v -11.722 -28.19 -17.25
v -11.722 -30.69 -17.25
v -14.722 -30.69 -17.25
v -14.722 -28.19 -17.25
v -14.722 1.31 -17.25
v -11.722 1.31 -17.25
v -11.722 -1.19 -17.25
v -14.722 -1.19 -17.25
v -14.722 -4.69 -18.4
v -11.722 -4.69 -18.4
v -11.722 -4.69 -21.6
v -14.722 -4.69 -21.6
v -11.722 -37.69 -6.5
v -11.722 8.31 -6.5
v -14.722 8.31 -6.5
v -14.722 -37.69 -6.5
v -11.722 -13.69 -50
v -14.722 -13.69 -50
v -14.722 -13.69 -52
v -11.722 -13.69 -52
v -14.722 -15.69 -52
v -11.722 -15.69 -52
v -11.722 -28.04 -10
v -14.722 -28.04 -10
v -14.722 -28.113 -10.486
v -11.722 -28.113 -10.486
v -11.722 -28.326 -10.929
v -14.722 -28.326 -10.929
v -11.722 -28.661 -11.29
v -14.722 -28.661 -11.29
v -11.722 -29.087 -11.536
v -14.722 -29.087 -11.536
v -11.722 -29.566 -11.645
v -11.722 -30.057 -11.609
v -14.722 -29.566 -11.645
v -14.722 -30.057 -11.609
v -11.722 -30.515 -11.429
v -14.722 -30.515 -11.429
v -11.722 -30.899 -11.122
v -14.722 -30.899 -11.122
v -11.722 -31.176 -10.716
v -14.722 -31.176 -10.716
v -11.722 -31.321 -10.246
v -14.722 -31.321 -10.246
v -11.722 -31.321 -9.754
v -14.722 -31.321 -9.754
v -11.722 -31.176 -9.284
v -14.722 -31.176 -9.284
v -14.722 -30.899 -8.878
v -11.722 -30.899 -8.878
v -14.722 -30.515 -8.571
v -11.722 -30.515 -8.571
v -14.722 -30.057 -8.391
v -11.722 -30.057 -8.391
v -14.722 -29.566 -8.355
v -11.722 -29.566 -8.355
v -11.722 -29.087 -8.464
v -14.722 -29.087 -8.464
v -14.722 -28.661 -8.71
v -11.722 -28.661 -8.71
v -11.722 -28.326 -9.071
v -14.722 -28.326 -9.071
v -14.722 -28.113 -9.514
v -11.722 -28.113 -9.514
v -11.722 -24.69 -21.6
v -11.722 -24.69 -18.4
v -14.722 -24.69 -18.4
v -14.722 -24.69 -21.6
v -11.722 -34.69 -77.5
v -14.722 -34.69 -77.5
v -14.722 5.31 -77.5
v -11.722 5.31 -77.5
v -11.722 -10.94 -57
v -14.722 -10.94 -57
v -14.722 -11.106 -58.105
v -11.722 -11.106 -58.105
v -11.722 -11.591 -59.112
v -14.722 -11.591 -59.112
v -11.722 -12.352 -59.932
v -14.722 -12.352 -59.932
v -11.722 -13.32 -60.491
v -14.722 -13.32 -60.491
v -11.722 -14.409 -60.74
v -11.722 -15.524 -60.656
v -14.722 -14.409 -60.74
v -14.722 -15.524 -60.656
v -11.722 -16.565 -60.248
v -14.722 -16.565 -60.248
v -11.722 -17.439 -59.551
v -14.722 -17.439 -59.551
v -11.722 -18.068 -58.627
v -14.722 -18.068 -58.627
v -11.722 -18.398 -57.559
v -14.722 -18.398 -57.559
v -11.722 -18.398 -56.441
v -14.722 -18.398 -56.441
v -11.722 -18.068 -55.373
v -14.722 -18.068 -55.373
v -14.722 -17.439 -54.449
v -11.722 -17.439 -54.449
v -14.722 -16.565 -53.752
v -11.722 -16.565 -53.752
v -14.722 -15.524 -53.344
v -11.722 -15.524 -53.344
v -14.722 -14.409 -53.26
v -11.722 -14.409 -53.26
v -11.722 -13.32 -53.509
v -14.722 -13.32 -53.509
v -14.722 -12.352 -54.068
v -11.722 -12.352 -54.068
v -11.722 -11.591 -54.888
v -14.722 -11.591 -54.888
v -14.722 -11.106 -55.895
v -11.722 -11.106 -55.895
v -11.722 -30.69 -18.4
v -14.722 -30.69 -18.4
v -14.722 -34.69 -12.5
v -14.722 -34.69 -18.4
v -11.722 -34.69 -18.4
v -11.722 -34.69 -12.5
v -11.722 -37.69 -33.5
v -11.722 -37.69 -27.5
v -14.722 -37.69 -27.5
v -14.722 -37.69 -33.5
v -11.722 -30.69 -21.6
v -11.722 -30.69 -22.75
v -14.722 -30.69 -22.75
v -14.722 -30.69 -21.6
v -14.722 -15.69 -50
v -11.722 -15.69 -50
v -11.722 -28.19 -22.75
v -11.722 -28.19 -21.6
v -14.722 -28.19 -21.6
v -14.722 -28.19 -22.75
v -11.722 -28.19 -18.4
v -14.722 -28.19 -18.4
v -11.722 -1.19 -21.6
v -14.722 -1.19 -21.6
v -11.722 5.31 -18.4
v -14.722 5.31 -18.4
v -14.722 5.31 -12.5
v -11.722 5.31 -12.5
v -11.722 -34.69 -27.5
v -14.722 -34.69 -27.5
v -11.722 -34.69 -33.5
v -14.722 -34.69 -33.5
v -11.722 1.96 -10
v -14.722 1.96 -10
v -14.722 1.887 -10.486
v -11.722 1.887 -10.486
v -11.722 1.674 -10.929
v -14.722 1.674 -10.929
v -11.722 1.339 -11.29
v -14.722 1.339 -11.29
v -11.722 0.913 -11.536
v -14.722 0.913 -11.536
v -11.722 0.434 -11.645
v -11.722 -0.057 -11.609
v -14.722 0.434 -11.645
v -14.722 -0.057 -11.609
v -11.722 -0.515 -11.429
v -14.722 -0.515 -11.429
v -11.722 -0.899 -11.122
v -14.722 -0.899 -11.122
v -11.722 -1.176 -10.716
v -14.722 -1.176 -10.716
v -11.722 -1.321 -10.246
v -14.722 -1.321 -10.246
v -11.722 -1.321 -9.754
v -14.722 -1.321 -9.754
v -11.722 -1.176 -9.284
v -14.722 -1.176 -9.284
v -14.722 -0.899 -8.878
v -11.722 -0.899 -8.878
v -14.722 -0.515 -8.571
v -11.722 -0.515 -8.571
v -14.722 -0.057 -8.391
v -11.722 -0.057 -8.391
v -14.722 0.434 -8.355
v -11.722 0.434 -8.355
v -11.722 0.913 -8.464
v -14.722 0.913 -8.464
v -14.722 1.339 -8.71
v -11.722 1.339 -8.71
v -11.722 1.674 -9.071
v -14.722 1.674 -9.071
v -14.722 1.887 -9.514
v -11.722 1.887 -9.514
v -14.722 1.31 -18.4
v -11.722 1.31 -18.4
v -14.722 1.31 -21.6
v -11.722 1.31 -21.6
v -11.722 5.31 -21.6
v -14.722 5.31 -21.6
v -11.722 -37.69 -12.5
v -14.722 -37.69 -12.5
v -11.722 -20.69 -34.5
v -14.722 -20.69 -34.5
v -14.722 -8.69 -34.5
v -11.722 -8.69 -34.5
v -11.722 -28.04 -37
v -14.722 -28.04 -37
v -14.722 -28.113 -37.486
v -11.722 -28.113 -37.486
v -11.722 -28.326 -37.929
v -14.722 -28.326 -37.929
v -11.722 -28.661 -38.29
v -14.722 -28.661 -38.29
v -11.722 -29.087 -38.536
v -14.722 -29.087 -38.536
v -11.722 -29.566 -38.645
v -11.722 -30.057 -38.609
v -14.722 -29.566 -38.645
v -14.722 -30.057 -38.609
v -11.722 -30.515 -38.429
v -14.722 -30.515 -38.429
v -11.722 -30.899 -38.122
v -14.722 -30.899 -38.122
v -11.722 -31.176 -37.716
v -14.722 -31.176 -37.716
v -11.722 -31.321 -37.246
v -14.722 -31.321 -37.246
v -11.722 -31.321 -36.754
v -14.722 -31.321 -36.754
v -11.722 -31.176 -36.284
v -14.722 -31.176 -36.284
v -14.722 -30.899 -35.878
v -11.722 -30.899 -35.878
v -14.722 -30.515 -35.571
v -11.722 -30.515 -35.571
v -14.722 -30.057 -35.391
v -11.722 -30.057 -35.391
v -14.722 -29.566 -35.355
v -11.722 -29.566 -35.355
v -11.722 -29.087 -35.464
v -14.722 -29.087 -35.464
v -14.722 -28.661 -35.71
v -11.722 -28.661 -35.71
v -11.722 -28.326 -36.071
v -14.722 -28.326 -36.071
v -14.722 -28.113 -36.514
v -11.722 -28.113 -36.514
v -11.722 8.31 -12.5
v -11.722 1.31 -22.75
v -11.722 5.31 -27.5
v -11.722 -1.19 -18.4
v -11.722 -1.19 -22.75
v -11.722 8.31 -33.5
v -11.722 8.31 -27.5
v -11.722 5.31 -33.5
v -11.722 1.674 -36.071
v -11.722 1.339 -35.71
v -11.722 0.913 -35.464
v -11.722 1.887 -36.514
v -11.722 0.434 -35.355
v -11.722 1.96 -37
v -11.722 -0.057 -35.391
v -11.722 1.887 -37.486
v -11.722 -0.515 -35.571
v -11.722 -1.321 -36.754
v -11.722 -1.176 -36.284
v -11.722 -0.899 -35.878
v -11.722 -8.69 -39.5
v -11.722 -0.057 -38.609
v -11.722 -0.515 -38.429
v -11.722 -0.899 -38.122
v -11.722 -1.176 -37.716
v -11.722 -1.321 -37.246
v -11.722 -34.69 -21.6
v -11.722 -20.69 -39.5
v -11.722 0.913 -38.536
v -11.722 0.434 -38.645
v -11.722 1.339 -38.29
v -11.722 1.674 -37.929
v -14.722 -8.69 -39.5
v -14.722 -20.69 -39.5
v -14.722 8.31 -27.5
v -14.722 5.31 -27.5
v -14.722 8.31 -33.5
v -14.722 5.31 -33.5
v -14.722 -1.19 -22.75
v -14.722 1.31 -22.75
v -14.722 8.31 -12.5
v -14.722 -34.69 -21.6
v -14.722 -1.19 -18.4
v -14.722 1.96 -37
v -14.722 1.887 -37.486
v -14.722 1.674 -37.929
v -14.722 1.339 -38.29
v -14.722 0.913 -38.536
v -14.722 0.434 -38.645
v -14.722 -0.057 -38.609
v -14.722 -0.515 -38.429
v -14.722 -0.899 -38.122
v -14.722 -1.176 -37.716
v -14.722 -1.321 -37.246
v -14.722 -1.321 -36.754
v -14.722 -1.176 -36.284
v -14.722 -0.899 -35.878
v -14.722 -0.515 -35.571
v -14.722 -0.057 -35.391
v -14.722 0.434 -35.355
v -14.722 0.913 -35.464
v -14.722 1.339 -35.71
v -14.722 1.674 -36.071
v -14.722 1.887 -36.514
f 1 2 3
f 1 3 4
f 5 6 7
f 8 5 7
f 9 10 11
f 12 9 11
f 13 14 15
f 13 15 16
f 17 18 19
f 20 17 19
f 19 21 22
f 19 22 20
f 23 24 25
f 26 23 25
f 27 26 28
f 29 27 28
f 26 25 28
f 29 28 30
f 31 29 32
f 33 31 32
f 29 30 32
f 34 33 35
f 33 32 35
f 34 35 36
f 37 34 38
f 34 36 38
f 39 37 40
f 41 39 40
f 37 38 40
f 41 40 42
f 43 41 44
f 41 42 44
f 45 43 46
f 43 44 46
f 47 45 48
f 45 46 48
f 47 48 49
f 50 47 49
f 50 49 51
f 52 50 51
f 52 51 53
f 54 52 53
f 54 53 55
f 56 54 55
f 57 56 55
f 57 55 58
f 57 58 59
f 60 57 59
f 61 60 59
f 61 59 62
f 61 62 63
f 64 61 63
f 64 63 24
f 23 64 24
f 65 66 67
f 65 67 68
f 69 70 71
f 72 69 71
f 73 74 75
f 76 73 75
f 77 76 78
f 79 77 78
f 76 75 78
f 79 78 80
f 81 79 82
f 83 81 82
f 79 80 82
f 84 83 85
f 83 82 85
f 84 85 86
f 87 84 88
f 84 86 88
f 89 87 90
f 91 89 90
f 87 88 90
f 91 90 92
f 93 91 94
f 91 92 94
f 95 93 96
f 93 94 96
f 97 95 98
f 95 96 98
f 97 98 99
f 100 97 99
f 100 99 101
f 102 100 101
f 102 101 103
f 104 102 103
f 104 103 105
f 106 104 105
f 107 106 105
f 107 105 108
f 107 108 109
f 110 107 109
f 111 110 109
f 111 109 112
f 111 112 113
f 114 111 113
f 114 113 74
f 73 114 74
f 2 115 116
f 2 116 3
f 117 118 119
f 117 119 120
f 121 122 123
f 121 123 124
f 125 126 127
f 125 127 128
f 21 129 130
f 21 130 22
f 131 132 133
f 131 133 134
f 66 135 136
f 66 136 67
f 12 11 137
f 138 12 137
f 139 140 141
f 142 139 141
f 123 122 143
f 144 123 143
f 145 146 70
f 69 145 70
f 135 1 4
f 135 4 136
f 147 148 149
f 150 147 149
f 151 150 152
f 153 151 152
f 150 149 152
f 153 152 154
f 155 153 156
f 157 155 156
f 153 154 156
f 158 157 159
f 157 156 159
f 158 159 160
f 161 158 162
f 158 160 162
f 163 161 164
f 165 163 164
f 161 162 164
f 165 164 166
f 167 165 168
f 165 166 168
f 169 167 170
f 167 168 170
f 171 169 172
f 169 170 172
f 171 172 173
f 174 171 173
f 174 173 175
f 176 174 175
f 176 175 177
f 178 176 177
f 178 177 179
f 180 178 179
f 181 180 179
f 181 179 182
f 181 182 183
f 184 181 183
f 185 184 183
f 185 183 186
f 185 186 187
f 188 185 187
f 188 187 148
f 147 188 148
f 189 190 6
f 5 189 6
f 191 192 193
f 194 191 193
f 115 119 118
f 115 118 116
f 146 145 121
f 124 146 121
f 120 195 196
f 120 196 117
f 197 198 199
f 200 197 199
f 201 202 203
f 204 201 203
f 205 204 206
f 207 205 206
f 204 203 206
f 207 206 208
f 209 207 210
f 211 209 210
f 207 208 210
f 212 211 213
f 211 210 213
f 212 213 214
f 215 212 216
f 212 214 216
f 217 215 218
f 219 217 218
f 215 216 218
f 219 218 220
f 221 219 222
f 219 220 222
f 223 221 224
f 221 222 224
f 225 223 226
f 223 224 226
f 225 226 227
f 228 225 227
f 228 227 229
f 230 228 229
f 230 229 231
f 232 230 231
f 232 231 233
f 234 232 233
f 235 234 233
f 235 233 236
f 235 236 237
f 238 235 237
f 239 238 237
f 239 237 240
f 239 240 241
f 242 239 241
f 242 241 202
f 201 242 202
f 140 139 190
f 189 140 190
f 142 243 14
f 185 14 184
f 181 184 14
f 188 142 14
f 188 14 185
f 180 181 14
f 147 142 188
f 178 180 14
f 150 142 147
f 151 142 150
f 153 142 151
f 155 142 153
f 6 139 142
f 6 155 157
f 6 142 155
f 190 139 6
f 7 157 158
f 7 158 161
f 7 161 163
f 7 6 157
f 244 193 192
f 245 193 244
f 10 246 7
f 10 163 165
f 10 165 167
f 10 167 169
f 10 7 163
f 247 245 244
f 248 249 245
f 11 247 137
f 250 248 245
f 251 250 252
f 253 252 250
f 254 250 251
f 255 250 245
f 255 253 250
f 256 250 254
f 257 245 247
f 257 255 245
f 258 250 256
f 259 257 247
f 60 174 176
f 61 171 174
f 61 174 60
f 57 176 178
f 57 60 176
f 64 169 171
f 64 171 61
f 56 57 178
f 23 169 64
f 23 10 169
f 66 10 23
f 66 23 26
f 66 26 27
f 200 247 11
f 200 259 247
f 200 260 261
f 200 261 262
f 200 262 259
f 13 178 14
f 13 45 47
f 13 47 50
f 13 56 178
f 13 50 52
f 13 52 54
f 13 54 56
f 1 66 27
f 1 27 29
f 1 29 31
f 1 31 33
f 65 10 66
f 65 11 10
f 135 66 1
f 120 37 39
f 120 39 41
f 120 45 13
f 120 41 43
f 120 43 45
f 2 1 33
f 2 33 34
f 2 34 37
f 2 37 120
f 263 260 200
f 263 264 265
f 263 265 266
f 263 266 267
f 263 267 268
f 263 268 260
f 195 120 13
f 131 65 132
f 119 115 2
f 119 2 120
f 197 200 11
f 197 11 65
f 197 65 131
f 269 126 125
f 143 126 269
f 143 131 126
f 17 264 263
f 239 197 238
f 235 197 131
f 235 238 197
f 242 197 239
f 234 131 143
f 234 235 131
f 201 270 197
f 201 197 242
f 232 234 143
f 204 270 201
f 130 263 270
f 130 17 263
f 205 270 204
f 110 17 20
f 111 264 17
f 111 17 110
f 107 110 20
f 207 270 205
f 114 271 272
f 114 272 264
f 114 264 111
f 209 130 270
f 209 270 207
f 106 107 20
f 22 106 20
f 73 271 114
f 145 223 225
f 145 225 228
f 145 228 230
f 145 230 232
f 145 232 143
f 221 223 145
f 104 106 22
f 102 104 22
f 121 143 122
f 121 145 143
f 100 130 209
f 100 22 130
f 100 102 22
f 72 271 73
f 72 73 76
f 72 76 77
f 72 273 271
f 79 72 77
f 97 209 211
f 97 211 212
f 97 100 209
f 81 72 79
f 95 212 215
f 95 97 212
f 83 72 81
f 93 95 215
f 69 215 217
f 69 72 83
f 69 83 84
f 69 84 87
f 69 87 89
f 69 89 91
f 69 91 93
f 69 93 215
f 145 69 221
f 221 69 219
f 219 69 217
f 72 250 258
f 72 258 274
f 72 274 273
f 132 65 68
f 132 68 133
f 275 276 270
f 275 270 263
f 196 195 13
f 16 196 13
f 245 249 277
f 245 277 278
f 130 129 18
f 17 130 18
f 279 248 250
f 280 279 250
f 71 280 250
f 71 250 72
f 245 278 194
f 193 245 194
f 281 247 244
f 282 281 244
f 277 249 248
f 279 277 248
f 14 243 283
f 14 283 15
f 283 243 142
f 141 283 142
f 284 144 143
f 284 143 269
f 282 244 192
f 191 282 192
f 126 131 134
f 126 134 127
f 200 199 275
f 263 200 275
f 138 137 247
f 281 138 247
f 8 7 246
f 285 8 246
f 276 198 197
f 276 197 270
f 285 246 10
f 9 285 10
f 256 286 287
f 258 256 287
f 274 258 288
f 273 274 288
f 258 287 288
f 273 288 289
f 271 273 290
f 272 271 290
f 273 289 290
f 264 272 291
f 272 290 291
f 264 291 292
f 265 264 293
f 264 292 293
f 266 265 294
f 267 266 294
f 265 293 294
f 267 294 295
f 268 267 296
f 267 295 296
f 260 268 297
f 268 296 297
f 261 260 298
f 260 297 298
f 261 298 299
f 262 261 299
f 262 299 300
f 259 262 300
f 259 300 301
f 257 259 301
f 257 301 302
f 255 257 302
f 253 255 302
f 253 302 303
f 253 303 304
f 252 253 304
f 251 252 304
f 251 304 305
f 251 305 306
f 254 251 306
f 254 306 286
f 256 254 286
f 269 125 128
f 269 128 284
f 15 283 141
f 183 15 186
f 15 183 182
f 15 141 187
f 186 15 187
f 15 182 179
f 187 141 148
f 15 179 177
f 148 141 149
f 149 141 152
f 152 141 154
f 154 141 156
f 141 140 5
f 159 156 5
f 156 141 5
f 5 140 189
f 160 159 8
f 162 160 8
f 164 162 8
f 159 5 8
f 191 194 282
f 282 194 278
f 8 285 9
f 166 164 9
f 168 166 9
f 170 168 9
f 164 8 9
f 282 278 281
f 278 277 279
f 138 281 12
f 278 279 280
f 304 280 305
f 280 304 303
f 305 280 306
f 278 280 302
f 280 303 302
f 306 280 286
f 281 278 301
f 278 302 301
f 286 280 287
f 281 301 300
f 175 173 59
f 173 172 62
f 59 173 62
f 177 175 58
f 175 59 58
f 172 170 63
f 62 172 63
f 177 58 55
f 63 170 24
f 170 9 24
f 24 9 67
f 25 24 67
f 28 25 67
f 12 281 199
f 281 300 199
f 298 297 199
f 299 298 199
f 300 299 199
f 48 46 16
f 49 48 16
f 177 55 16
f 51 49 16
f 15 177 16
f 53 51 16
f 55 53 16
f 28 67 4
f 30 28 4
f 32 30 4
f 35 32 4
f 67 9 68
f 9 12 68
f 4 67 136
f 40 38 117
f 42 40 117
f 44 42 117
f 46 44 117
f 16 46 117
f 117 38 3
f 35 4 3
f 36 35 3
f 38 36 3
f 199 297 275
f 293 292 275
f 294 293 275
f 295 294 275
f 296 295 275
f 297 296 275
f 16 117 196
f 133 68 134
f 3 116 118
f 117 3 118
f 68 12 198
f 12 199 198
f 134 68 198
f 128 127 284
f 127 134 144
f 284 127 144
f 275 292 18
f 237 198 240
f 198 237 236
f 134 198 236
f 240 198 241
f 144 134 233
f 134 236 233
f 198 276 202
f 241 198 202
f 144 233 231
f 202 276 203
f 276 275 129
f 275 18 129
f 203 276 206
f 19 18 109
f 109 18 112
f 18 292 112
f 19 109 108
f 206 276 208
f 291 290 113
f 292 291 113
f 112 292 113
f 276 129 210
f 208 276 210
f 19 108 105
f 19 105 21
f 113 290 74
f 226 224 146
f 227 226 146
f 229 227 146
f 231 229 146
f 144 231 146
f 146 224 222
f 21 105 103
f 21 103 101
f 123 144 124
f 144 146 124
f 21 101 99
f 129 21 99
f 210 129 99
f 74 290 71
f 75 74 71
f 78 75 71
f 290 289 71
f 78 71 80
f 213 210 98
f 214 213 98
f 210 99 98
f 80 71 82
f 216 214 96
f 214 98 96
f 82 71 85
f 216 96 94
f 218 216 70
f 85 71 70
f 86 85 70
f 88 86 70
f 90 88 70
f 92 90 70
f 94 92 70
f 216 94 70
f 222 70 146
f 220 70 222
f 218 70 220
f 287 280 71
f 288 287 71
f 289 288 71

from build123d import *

# Parameters (mm, degrees)
SKETCH024_W                = 40
SKETCH024_H                = 27
SKETCH024_R                = 1.9
PAD010_DEPTH               = 3
SKETCH025_W                = 3
SKETCH025_H                = 6
PAD011_DEPTH               = 3
SKETCH025_MIRRORED003_2_W  = 3
SKETCH025_MIRRORED003_2_H  = 6
PAD011_MIRRORED003_2_DEPTH = 3
POCKET014_DEPTH            = 109.846683
SKETCH027_R                = 4.5
SKETCH027_W                = 40
SKETCH027_H                = 50
PAD012_DEPTH               = 3
SKETCH028_R                = 1.65
SKETCH028_W                = 12
SKETCH028_H                = 5
POCKET015_DEPTH            = 3.001
SKETCH029_R                = 3.75
SKETCH029_W                = 2
SKETCH029_H                = 2
POCKET016_DEPTH            = 3.001


with BuildPart() as part:
    # Sketch024 → Pad010 (new body)
    with BuildSketch(Plane.YZ):
        Rectangle(SKETCH024_W, SKETCH024_H)
        with Locations((0, 8.5)):
            Circle(SKETCH024_R, mode=Mode.SUBTRACT)
    extrude(amount=PAD010_DEPTH)

    # Sketch025 (on Face7 of Pad010) → Pad011 (join)
    with BuildSketch(Plane.YZ.offset(3)):
        with Locations((-21.5, 10.5)):
            Rectangle(SKETCH025_W, SKETCH025_H)
    pad011 = extrude(amount=-PAD011_DEPTH)

    # Sketch025 Mirrored003 2 → Pad011 Mirrored003 2 (add)
    with BuildSketch(Plane(origin=(3, 0, 0), x_dir=(0, -1, 0), z_dir=(-1, 0, 0))):
        with Locations((-21.5, 10.5)):
            Rectangle(SKETCH025_MIRRORED003_2_W, SKETCH025_MIRRORED003_2_H)
    pad011_mirrored003_2 = extrude(amount=PAD011_MIRRORED003_2_DEPTH)

    # Mirrored005: Pad011, Pad011 Mirrored003 2 across Sketch025 H_Axis
    add(pad011.mirror(Plane(origin=(3, 0, 0), x_dir=(1, 0, 0), z_dir=(0, 0, 1))))
    add(pad011_mirrored003_2.mirror(Plane(origin=(3, 0, 0), x_dir=(1, 0, 0), z_dir=(0, 0, 1))))

    # Sketch026 (on Face12 of MultiTransform001) → Pocket014 (cut, through all)
    with BuildSketch(Plane.YZ.offset(3)):
        Polygon((-20, 1.6), (-16, 1.6), (-16, 2.75), (-13.5, 2.75), (-13.5, 1.6), (-10, 1.6), (-10, -1.6), (-13.5, -1.6), (-13.5, -2.75), (-16, -2.75), (-16, -1.6), (-20, -1.6), align=None)
    pocket014 = extrude(amount=-POCKET014_DEPTH, mode=Mode.SUBTRACT)

    # Mirrored004: Pocket014 across Sketch026 V_Axis
    add(pocket014.mirror(Plane(origin=(3, 0, 0), x_dir=(1, 0, 0), z_dir=(0, 1, 0))), mode=Mode.SUBTRACT)

    # Sketch027 (on Face5 of Mirrored004) → Pad012 (join)
    with BuildSketch(Plane(origin=(0, 0, 0), x_dir=(0, 1, 0), z_dir=(-1, 0, 0))):
        with Locations((0, -8.5)):
            Circle(SKETCH027_R)
        with Locations((0, 32.5)):
            Rectangle(SKETCH027_W, SKETCH027_H)
    extrude(amount=-PAD012_DEPTH)

    # Sketch028 (on Face42 of Pad012) → Pocket015 (cut, through all)
    with BuildSketch(Plane(origin=(0, 0, 0), x_dir=(0, 1, 0), z_dir=(-1, 0, 0))):
        with Locations((-15, 17)):
            Circle(SKETCH028_R)
        with Locations((15, 17)):
            Circle(SKETCH028_R)
        with Locations((15, -10)):
            Circle(SKETCH028_R)
        with Locations((-15, -10)):
            Circle(SKETCH028_R)
        with Locations((0, 17)):
            Rectangle(SKETCH028_W, SKETCH028_H)
    extrude(amount=-POCKET015_DEPTH, mode=Mode.SUBTRACT)

    # Sketch029 (on Face2 of Pocket015) → Pocket016 (cut, through all)
    with BuildSketch(Plane(origin=(0, 0, 0), x_dir=(0, 1, 0), z_dir=(-1, 0, 0))):
        with Locations((0, 37)):
            Circle(SKETCH029_R)
        with Locations((0, 31)):
            Rectangle(SKETCH029_W, SKETCH029_H)
    extrude(amount=-POCKET016_DEPTH, mode=Mode.SUBTRACT)


with BuildPart() as part_1:
    # Body006 placement: moved
    add(part.part.moved(Location((-14.7217, -14.6897, -20))))


solid = part_1.part
